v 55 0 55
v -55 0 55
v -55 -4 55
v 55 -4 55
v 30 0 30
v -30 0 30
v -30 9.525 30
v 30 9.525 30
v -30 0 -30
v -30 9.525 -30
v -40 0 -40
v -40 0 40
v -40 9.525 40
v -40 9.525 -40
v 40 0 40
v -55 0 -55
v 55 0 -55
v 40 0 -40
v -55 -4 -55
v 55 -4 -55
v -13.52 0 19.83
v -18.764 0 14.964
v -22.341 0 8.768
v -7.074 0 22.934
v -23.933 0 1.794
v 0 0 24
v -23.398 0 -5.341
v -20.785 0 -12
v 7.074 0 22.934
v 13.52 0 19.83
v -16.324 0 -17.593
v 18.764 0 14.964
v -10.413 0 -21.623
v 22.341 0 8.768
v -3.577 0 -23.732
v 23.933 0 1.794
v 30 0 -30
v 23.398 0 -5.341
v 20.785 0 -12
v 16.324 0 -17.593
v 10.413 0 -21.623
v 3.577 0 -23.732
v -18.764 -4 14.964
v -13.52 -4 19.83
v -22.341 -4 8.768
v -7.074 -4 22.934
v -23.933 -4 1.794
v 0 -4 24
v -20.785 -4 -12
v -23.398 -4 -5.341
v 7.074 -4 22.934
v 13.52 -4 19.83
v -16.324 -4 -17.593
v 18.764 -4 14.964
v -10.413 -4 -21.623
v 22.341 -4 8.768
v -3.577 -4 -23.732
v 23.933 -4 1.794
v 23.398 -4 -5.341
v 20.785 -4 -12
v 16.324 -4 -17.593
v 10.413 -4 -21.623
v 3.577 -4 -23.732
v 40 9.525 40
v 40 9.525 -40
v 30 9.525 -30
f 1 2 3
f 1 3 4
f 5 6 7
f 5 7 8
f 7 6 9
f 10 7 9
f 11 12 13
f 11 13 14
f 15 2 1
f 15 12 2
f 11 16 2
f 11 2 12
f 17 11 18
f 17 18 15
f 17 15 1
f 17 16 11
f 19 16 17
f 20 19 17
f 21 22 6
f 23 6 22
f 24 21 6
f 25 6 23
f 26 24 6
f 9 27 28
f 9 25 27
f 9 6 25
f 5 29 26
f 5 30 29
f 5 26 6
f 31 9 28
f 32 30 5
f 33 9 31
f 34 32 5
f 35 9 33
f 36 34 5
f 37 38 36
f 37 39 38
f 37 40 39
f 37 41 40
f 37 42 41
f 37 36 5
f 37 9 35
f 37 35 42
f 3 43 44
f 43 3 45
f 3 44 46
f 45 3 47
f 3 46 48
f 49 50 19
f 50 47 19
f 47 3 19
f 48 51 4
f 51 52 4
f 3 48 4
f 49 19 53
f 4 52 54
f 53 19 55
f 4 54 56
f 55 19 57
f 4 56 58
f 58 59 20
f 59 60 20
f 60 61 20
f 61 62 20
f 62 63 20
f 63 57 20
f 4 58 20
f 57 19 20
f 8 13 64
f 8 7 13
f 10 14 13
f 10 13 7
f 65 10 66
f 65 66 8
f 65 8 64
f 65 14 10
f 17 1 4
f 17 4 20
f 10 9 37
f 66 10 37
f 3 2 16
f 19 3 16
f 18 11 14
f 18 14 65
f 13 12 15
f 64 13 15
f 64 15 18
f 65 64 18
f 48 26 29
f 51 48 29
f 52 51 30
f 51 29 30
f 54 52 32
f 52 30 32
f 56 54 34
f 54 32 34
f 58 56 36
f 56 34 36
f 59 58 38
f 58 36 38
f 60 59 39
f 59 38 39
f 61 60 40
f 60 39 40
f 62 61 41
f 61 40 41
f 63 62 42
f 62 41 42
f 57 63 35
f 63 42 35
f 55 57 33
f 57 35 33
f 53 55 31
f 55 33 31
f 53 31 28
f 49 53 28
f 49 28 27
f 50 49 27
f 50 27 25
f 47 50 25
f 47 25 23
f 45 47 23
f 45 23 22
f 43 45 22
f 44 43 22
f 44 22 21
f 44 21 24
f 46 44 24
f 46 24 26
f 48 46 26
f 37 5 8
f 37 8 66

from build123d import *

# Parameters (mm, degrees)
SKETCH1_W           = 110
SKETCH1_H           = 110
BOSS_EXTRUDE1_DEPTH = 4
SKETCH2_W           = 80
SKETCH2_H           = 80
SKETCH2_W_2         = 60
SKETCH2_H_2         = 60
BOSS_EXTRUDE2_DEPTH = 9.525
SKETCH3_R           = 24.000000006
CUT_EXTRUDE1_DEPTH  = 20


with BuildPart() as part:
    # Sketch1 → Boss-Extrude1 (new body)
    with BuildSketch(Plane(origin=(0, 0, 0), x_dir=(1, 0, 0), z_dir=(0, 1, 0))):
        Rectangle(SKETCH1_W, SKETCH1_H)
    extrude(amount=-BOSS_EXTRUDE1_DEPTH)

    # Sketch2 → Boss-Extrude2 (add)
    with BuildSketch(Plane(origin=(0, 0, 0), x_dir=(1, 0, 0), z_dir=(0, 1, 0))):
        Rectangle(SKETCH2_W, SKETCH2_H)
        Rectangle(SKETCH2_W_2, SKETCH2_H_2, mode=Mode.SUBTRACT)
    extrude(amount=BOSS_EXTRUDE2_DEPTH)

    # Sketch3 → Cut-Extrude1 (cut)
    with BuildSketch(Plane(origin=(0, 0, 0), x_dir=(1, 0, 0), z_dir=(0, 1, 0))):
        Circle(SKETCH3_R)
    extrude(amount=-CUT_EXTRUDE1_DEPTH, mode=Mode.SUBTRACT)


solid = part.part
